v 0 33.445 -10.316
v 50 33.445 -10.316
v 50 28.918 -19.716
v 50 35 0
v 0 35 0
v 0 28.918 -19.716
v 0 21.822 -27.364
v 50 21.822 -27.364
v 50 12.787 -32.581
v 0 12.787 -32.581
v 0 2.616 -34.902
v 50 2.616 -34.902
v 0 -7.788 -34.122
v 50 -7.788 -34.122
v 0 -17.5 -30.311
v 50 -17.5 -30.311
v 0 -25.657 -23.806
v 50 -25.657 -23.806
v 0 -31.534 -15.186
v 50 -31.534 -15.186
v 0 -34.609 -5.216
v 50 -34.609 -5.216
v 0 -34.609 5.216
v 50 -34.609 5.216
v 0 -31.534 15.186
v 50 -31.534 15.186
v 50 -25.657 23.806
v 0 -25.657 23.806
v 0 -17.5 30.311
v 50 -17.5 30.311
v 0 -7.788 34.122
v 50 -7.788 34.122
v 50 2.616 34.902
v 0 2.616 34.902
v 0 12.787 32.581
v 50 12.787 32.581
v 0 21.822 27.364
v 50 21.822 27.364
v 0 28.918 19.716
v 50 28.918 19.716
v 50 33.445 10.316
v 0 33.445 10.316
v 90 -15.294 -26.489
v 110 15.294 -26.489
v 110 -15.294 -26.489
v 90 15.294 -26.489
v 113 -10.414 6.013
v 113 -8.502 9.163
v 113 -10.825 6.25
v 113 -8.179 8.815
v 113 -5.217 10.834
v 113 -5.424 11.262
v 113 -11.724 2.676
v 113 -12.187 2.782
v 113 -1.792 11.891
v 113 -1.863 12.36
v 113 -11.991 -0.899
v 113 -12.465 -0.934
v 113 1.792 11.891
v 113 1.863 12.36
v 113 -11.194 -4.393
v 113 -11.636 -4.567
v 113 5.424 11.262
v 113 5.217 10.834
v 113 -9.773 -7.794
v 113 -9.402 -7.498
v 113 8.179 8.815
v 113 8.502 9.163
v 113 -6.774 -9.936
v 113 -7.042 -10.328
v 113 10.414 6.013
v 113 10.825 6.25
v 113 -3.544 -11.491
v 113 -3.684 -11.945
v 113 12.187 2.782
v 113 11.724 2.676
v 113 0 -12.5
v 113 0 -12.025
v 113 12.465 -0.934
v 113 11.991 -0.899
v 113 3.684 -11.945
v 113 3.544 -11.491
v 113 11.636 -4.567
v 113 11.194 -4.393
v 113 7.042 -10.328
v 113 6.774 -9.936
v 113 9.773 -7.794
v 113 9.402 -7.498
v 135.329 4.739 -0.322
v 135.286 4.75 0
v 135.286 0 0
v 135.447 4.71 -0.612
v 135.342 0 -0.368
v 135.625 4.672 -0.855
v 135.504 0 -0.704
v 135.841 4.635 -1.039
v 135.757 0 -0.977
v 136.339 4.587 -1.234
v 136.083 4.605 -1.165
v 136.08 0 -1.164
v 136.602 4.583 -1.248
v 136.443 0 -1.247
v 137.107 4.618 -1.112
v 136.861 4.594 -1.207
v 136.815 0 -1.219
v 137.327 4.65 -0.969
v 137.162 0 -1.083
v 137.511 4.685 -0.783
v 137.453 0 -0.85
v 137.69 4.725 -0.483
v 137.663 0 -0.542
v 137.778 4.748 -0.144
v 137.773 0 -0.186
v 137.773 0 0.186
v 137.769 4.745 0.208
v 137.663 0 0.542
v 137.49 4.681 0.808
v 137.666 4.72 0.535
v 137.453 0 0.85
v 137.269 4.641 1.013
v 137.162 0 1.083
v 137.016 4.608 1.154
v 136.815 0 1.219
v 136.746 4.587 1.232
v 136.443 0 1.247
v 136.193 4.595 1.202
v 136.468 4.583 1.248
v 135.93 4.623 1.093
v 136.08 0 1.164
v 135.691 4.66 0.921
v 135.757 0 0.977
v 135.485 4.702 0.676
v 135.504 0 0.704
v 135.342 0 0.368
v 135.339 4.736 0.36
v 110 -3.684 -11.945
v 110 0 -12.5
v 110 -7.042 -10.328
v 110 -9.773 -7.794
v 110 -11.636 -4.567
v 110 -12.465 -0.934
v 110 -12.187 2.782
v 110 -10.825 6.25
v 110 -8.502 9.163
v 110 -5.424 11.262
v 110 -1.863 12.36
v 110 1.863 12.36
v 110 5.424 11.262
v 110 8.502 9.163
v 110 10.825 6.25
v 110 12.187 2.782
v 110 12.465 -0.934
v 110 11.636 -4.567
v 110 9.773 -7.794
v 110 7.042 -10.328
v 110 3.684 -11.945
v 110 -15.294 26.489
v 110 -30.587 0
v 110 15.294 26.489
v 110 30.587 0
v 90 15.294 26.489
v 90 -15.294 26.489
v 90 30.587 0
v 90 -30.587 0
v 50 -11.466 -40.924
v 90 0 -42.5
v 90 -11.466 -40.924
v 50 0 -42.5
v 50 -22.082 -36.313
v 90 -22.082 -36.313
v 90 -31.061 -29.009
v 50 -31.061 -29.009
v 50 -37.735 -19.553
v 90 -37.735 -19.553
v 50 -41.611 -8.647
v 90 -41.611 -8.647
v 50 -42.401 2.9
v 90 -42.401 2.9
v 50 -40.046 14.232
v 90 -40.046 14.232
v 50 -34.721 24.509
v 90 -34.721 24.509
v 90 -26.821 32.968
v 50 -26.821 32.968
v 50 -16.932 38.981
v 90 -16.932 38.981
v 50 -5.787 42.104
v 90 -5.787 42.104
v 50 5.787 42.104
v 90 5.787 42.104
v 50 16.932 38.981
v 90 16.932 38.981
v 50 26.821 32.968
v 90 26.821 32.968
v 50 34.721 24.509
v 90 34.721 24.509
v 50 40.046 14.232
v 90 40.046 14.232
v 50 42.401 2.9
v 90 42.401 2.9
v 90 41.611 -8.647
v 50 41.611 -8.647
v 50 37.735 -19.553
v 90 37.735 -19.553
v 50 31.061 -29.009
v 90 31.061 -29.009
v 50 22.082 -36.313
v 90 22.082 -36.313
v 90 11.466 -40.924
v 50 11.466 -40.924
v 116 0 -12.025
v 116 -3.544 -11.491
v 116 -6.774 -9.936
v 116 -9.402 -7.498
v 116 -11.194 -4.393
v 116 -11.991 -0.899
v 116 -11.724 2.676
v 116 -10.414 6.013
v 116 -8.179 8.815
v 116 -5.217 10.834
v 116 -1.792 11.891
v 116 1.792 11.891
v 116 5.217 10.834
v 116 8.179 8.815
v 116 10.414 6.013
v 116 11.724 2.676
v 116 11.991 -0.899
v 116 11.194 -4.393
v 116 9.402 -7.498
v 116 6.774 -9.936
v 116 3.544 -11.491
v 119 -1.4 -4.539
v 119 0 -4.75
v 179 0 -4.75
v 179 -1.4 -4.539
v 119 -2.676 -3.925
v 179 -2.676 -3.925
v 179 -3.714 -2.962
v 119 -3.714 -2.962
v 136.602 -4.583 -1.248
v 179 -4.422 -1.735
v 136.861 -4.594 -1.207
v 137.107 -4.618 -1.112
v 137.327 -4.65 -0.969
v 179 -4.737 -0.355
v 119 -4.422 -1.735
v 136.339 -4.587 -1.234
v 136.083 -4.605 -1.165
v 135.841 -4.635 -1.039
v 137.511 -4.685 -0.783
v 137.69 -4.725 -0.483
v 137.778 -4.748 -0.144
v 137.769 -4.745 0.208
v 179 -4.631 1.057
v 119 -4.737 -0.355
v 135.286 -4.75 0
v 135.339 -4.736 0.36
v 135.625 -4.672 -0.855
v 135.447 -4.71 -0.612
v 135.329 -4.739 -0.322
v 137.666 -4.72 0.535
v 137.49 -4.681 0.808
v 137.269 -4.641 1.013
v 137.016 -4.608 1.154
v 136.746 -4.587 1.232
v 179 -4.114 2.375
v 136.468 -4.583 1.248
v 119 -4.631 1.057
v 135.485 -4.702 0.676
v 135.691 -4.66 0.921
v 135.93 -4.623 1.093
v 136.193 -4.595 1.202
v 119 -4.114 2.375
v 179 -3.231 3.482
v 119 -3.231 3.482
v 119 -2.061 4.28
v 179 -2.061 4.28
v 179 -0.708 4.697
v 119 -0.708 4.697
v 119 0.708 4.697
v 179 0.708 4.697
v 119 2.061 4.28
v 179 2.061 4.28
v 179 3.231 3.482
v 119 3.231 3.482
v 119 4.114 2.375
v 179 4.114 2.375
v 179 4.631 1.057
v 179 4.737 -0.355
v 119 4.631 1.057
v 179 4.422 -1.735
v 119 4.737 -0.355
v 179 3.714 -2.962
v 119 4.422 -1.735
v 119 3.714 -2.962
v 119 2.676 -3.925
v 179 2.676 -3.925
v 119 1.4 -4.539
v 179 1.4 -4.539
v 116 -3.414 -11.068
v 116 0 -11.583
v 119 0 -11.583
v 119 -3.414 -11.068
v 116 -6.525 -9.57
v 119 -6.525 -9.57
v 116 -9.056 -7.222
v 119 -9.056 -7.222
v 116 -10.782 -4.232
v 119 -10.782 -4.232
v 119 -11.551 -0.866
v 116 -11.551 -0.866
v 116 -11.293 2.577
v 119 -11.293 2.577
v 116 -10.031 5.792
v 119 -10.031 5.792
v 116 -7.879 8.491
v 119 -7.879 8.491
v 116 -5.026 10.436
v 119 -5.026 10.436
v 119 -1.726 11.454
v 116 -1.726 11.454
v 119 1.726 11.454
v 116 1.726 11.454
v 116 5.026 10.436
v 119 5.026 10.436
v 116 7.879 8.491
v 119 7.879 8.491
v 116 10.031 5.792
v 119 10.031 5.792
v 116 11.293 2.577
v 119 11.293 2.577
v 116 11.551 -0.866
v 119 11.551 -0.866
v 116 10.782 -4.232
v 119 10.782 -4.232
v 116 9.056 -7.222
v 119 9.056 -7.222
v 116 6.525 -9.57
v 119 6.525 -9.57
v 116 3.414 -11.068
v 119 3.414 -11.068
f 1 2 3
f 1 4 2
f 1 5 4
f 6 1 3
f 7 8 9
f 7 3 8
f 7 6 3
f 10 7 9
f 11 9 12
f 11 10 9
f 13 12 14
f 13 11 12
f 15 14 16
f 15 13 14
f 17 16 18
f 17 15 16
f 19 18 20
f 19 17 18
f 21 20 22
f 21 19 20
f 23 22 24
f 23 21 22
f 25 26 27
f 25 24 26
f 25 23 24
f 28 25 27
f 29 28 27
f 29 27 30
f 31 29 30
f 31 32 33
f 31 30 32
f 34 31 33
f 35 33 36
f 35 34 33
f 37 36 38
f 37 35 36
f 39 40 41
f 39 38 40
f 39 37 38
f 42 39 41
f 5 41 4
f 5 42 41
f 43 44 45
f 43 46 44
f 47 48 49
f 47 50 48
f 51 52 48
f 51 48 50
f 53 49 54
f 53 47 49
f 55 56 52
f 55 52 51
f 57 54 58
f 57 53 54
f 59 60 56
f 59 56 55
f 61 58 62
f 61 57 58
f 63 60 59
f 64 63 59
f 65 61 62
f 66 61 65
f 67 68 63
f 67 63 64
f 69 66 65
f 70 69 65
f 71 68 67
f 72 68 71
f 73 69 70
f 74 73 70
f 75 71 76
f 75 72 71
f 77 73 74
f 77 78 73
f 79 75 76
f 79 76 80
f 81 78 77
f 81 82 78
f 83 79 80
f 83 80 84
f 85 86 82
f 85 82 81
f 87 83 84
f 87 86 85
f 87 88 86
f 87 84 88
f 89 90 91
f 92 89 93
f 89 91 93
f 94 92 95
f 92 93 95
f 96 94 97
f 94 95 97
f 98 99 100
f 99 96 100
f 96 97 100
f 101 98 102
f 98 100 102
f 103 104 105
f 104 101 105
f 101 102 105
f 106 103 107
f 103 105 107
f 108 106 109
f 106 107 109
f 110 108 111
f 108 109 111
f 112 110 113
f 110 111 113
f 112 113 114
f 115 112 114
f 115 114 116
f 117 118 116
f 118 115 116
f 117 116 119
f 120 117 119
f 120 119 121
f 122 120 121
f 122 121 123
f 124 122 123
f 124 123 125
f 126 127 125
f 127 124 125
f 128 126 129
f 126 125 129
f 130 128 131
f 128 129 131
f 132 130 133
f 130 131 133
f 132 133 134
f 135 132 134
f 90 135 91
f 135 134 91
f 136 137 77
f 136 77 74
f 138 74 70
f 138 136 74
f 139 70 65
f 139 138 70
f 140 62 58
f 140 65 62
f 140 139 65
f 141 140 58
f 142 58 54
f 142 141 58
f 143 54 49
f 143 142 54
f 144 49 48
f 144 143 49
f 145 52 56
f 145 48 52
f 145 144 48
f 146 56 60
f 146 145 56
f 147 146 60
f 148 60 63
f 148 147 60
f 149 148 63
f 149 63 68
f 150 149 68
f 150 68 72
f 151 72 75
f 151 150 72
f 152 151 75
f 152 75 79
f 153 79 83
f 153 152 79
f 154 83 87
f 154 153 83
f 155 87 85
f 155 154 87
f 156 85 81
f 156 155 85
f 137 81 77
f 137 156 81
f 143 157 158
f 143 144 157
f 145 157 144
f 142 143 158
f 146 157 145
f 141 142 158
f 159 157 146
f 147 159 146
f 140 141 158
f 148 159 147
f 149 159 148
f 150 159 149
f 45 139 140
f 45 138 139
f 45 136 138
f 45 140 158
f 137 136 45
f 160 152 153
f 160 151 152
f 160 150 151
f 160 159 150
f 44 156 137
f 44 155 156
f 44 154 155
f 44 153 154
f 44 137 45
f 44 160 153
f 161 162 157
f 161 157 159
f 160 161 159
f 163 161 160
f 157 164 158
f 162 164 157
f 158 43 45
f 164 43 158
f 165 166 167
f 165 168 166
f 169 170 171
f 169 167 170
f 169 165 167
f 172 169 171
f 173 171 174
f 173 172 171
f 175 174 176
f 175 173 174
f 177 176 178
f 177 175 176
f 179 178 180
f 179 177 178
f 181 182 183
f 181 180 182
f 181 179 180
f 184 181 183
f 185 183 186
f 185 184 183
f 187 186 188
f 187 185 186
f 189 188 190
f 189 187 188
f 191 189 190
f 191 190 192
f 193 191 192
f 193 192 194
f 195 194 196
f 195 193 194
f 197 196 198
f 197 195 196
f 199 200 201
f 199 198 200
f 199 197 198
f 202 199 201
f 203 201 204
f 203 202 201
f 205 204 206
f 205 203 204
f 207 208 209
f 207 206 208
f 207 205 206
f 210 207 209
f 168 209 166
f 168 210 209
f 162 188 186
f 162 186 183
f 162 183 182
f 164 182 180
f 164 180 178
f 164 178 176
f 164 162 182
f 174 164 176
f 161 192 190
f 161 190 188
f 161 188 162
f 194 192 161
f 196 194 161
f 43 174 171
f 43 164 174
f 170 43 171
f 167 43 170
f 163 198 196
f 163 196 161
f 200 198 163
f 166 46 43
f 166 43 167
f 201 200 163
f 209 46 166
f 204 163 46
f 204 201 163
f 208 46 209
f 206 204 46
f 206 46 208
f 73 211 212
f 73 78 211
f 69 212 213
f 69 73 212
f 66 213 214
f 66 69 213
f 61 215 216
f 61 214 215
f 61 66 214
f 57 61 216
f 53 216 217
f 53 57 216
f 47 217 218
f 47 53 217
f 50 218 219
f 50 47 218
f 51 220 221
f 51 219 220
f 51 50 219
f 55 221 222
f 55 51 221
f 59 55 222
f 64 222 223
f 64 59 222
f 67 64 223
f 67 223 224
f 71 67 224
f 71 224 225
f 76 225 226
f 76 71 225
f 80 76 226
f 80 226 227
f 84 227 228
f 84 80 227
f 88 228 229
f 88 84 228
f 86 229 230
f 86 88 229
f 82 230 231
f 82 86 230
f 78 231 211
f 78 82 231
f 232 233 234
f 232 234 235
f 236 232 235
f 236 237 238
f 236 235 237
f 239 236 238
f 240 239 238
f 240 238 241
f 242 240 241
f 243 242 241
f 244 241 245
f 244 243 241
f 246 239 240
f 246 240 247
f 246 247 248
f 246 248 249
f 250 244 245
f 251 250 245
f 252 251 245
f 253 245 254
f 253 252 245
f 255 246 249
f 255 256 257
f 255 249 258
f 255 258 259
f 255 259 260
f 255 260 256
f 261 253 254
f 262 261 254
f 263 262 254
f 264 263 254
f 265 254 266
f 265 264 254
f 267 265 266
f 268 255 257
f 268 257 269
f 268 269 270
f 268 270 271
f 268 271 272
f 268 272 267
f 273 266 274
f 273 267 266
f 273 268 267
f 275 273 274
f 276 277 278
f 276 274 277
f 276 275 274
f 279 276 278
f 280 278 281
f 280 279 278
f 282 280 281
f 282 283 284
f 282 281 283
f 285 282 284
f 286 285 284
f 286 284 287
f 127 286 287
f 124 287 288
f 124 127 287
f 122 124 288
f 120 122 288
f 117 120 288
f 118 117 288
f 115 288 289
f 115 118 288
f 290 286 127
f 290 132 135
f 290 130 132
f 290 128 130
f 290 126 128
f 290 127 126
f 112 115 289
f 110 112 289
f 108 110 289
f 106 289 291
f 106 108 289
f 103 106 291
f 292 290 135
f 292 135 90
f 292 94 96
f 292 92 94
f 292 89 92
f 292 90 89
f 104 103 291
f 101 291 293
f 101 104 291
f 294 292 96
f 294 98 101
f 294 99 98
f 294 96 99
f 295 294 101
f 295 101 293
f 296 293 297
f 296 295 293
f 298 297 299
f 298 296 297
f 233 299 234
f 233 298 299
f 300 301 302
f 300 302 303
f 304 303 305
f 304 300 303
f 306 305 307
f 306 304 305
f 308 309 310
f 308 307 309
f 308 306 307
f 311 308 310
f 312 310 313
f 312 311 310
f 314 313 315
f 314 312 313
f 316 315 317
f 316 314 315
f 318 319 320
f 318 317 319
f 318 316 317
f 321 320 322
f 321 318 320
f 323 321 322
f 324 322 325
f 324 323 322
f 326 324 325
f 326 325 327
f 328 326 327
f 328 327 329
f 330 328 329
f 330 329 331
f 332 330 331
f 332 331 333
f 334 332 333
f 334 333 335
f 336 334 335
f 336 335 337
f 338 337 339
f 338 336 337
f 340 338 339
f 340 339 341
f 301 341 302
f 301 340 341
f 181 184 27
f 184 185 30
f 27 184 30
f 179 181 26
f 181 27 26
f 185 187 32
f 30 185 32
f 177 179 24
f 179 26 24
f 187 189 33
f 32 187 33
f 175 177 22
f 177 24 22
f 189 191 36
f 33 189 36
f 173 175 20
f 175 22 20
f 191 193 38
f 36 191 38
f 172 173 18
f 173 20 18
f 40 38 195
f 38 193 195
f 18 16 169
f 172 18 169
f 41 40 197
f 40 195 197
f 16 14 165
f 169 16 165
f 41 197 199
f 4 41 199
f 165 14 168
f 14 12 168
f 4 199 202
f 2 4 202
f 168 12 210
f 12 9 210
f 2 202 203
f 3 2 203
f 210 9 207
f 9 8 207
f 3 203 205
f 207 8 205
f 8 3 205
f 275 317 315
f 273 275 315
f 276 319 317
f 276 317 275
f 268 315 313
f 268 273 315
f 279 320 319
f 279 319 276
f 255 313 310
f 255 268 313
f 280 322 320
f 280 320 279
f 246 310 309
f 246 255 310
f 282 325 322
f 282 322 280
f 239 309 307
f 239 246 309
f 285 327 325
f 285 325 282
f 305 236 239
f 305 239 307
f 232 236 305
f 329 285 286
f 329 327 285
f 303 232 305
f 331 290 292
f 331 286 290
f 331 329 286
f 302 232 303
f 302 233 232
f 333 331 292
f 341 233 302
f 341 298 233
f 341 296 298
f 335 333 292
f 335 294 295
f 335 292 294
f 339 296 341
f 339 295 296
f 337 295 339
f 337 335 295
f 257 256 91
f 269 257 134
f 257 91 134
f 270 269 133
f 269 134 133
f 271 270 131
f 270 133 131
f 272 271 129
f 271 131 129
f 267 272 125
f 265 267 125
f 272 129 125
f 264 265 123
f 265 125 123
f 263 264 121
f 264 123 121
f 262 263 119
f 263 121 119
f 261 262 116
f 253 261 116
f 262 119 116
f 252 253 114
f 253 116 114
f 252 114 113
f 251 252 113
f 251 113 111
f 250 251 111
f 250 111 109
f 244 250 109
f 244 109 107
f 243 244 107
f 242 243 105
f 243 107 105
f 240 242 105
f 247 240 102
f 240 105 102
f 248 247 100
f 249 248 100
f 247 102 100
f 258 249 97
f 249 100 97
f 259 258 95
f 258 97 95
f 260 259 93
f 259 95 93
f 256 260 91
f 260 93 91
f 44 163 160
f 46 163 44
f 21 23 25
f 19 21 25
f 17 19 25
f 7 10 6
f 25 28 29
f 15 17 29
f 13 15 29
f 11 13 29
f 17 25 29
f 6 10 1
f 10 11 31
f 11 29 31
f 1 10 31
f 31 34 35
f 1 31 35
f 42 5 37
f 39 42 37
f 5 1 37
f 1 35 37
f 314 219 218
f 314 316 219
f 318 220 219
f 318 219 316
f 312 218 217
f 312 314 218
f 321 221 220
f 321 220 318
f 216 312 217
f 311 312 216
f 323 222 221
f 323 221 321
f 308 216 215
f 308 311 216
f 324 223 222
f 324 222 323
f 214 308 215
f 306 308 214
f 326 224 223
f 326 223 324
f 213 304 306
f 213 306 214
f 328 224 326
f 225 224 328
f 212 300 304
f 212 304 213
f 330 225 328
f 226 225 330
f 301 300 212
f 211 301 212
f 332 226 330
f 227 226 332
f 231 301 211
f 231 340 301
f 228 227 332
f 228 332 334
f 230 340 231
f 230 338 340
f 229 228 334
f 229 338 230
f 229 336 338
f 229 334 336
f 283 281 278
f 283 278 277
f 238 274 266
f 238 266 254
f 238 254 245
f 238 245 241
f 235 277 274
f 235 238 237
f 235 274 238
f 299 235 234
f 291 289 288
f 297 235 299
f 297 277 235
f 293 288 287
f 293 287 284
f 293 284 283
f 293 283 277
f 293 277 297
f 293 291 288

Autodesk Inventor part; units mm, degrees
ref_plane "YZ Plane" through (0, 0, 0) normal (1, 0, 0) x (0, 1, 0)
ref_plane "XZ Plane" through (0, 0, 0) normal (0, 1, 0) x (-1, 0, 0)
ref_plane "XY Plane" through (0, 0, 0) normal (0, 0, 1) x (1, 0, 0)
sketch "Sketch1" plane through (0, 0, 0) normal (1, 0, 0) x (0, 1, 0)
  circle A0 centre (0, 0) radius 35
  dimension "d0" = 70
extrude "Extrusion1" add sketch "Sketch1" along normal blind 50
sketch "Sketch2" plane through (50, 0, 0) normal (1, 0, 0) x (0, 0, -1)
  circle A0 centre (0, 0) radius 42.5
  dimension "d3" = 85
extrude "Extrusion2" add sketch "Sketch2" along normal blind 40
sketch "Sketch3" plane through (90, 0, 0) normal (1, 0, 0) x (0, 0, -1)
  line L0 (0, 30.5873) -> (26.4894, 15.2937)
  line L1 (26.4894, 15.2937) -> (26.4894, -15.2937)
  line L2 (26.4894, -15.2937) -> (0, -30.5873)
  line L3 (0, -30.5873) -> (-26.4894, -15.2937)
  line L4 (-26.4894, -15.2937) -> (-26.4894, 15.2937)
  line L5 (-26.4894, 15.2937) -> (0, 30.5873)
  point P0 (0, 0)
  point P1 (0, 0)
extrude "Extrusion3" add sketch "Sketch3" along normal blind 20
sketch "Sketch4" plane through (110, 0, 0) normal (1, 0, 0) x (0, 0, -1)
  circle A0 centre (0, 0) radius 12.5
  dimension "d8" = 25
extrude "Extrusion4" add sketch "Sketch4" along normal blind 3
sketch "Sketch5" plane through (113, 0, 0) normal (1, 0, 0) x (0, 0, -1)
  circle A0 centre (0, 0) radius 12.0251
extrude "Extrusion5" add sketch "Sketch5" along normal blind 3
sketch "Sketch6" plane through (116, 0, 0) normal (1, 0, 0) x (0, 0, -1)
  circle A0 centre (0, 0) radius 11.5831
extrude "Extrusion6" add sketch "Sketch6" along normal blind 3
sketch "Sketch7" plane through (119, 0, 0) normal (1, 0, 0) x (0, 0, -1)
  circle A0 centre (0, 0) radius 4.75
  dimension "d16" = 9.5
extrude "Extrusion7" add sketch "Sketch7" along normal blind 60
sketch "Sketch8" plane through (0, 0, 0) normal (0, 1, 0) x (-1, 0, 0)
  circle A0 centre (-136.5365, 0) radius 1.25
  point P0 (0, 0)
  dimension "d19" = 2.5
extrude "Extrusion8" cut sketch "Sketch8" along normal mid plane 20
properties part number "DC" material "Aluminum 6061-AHC"
